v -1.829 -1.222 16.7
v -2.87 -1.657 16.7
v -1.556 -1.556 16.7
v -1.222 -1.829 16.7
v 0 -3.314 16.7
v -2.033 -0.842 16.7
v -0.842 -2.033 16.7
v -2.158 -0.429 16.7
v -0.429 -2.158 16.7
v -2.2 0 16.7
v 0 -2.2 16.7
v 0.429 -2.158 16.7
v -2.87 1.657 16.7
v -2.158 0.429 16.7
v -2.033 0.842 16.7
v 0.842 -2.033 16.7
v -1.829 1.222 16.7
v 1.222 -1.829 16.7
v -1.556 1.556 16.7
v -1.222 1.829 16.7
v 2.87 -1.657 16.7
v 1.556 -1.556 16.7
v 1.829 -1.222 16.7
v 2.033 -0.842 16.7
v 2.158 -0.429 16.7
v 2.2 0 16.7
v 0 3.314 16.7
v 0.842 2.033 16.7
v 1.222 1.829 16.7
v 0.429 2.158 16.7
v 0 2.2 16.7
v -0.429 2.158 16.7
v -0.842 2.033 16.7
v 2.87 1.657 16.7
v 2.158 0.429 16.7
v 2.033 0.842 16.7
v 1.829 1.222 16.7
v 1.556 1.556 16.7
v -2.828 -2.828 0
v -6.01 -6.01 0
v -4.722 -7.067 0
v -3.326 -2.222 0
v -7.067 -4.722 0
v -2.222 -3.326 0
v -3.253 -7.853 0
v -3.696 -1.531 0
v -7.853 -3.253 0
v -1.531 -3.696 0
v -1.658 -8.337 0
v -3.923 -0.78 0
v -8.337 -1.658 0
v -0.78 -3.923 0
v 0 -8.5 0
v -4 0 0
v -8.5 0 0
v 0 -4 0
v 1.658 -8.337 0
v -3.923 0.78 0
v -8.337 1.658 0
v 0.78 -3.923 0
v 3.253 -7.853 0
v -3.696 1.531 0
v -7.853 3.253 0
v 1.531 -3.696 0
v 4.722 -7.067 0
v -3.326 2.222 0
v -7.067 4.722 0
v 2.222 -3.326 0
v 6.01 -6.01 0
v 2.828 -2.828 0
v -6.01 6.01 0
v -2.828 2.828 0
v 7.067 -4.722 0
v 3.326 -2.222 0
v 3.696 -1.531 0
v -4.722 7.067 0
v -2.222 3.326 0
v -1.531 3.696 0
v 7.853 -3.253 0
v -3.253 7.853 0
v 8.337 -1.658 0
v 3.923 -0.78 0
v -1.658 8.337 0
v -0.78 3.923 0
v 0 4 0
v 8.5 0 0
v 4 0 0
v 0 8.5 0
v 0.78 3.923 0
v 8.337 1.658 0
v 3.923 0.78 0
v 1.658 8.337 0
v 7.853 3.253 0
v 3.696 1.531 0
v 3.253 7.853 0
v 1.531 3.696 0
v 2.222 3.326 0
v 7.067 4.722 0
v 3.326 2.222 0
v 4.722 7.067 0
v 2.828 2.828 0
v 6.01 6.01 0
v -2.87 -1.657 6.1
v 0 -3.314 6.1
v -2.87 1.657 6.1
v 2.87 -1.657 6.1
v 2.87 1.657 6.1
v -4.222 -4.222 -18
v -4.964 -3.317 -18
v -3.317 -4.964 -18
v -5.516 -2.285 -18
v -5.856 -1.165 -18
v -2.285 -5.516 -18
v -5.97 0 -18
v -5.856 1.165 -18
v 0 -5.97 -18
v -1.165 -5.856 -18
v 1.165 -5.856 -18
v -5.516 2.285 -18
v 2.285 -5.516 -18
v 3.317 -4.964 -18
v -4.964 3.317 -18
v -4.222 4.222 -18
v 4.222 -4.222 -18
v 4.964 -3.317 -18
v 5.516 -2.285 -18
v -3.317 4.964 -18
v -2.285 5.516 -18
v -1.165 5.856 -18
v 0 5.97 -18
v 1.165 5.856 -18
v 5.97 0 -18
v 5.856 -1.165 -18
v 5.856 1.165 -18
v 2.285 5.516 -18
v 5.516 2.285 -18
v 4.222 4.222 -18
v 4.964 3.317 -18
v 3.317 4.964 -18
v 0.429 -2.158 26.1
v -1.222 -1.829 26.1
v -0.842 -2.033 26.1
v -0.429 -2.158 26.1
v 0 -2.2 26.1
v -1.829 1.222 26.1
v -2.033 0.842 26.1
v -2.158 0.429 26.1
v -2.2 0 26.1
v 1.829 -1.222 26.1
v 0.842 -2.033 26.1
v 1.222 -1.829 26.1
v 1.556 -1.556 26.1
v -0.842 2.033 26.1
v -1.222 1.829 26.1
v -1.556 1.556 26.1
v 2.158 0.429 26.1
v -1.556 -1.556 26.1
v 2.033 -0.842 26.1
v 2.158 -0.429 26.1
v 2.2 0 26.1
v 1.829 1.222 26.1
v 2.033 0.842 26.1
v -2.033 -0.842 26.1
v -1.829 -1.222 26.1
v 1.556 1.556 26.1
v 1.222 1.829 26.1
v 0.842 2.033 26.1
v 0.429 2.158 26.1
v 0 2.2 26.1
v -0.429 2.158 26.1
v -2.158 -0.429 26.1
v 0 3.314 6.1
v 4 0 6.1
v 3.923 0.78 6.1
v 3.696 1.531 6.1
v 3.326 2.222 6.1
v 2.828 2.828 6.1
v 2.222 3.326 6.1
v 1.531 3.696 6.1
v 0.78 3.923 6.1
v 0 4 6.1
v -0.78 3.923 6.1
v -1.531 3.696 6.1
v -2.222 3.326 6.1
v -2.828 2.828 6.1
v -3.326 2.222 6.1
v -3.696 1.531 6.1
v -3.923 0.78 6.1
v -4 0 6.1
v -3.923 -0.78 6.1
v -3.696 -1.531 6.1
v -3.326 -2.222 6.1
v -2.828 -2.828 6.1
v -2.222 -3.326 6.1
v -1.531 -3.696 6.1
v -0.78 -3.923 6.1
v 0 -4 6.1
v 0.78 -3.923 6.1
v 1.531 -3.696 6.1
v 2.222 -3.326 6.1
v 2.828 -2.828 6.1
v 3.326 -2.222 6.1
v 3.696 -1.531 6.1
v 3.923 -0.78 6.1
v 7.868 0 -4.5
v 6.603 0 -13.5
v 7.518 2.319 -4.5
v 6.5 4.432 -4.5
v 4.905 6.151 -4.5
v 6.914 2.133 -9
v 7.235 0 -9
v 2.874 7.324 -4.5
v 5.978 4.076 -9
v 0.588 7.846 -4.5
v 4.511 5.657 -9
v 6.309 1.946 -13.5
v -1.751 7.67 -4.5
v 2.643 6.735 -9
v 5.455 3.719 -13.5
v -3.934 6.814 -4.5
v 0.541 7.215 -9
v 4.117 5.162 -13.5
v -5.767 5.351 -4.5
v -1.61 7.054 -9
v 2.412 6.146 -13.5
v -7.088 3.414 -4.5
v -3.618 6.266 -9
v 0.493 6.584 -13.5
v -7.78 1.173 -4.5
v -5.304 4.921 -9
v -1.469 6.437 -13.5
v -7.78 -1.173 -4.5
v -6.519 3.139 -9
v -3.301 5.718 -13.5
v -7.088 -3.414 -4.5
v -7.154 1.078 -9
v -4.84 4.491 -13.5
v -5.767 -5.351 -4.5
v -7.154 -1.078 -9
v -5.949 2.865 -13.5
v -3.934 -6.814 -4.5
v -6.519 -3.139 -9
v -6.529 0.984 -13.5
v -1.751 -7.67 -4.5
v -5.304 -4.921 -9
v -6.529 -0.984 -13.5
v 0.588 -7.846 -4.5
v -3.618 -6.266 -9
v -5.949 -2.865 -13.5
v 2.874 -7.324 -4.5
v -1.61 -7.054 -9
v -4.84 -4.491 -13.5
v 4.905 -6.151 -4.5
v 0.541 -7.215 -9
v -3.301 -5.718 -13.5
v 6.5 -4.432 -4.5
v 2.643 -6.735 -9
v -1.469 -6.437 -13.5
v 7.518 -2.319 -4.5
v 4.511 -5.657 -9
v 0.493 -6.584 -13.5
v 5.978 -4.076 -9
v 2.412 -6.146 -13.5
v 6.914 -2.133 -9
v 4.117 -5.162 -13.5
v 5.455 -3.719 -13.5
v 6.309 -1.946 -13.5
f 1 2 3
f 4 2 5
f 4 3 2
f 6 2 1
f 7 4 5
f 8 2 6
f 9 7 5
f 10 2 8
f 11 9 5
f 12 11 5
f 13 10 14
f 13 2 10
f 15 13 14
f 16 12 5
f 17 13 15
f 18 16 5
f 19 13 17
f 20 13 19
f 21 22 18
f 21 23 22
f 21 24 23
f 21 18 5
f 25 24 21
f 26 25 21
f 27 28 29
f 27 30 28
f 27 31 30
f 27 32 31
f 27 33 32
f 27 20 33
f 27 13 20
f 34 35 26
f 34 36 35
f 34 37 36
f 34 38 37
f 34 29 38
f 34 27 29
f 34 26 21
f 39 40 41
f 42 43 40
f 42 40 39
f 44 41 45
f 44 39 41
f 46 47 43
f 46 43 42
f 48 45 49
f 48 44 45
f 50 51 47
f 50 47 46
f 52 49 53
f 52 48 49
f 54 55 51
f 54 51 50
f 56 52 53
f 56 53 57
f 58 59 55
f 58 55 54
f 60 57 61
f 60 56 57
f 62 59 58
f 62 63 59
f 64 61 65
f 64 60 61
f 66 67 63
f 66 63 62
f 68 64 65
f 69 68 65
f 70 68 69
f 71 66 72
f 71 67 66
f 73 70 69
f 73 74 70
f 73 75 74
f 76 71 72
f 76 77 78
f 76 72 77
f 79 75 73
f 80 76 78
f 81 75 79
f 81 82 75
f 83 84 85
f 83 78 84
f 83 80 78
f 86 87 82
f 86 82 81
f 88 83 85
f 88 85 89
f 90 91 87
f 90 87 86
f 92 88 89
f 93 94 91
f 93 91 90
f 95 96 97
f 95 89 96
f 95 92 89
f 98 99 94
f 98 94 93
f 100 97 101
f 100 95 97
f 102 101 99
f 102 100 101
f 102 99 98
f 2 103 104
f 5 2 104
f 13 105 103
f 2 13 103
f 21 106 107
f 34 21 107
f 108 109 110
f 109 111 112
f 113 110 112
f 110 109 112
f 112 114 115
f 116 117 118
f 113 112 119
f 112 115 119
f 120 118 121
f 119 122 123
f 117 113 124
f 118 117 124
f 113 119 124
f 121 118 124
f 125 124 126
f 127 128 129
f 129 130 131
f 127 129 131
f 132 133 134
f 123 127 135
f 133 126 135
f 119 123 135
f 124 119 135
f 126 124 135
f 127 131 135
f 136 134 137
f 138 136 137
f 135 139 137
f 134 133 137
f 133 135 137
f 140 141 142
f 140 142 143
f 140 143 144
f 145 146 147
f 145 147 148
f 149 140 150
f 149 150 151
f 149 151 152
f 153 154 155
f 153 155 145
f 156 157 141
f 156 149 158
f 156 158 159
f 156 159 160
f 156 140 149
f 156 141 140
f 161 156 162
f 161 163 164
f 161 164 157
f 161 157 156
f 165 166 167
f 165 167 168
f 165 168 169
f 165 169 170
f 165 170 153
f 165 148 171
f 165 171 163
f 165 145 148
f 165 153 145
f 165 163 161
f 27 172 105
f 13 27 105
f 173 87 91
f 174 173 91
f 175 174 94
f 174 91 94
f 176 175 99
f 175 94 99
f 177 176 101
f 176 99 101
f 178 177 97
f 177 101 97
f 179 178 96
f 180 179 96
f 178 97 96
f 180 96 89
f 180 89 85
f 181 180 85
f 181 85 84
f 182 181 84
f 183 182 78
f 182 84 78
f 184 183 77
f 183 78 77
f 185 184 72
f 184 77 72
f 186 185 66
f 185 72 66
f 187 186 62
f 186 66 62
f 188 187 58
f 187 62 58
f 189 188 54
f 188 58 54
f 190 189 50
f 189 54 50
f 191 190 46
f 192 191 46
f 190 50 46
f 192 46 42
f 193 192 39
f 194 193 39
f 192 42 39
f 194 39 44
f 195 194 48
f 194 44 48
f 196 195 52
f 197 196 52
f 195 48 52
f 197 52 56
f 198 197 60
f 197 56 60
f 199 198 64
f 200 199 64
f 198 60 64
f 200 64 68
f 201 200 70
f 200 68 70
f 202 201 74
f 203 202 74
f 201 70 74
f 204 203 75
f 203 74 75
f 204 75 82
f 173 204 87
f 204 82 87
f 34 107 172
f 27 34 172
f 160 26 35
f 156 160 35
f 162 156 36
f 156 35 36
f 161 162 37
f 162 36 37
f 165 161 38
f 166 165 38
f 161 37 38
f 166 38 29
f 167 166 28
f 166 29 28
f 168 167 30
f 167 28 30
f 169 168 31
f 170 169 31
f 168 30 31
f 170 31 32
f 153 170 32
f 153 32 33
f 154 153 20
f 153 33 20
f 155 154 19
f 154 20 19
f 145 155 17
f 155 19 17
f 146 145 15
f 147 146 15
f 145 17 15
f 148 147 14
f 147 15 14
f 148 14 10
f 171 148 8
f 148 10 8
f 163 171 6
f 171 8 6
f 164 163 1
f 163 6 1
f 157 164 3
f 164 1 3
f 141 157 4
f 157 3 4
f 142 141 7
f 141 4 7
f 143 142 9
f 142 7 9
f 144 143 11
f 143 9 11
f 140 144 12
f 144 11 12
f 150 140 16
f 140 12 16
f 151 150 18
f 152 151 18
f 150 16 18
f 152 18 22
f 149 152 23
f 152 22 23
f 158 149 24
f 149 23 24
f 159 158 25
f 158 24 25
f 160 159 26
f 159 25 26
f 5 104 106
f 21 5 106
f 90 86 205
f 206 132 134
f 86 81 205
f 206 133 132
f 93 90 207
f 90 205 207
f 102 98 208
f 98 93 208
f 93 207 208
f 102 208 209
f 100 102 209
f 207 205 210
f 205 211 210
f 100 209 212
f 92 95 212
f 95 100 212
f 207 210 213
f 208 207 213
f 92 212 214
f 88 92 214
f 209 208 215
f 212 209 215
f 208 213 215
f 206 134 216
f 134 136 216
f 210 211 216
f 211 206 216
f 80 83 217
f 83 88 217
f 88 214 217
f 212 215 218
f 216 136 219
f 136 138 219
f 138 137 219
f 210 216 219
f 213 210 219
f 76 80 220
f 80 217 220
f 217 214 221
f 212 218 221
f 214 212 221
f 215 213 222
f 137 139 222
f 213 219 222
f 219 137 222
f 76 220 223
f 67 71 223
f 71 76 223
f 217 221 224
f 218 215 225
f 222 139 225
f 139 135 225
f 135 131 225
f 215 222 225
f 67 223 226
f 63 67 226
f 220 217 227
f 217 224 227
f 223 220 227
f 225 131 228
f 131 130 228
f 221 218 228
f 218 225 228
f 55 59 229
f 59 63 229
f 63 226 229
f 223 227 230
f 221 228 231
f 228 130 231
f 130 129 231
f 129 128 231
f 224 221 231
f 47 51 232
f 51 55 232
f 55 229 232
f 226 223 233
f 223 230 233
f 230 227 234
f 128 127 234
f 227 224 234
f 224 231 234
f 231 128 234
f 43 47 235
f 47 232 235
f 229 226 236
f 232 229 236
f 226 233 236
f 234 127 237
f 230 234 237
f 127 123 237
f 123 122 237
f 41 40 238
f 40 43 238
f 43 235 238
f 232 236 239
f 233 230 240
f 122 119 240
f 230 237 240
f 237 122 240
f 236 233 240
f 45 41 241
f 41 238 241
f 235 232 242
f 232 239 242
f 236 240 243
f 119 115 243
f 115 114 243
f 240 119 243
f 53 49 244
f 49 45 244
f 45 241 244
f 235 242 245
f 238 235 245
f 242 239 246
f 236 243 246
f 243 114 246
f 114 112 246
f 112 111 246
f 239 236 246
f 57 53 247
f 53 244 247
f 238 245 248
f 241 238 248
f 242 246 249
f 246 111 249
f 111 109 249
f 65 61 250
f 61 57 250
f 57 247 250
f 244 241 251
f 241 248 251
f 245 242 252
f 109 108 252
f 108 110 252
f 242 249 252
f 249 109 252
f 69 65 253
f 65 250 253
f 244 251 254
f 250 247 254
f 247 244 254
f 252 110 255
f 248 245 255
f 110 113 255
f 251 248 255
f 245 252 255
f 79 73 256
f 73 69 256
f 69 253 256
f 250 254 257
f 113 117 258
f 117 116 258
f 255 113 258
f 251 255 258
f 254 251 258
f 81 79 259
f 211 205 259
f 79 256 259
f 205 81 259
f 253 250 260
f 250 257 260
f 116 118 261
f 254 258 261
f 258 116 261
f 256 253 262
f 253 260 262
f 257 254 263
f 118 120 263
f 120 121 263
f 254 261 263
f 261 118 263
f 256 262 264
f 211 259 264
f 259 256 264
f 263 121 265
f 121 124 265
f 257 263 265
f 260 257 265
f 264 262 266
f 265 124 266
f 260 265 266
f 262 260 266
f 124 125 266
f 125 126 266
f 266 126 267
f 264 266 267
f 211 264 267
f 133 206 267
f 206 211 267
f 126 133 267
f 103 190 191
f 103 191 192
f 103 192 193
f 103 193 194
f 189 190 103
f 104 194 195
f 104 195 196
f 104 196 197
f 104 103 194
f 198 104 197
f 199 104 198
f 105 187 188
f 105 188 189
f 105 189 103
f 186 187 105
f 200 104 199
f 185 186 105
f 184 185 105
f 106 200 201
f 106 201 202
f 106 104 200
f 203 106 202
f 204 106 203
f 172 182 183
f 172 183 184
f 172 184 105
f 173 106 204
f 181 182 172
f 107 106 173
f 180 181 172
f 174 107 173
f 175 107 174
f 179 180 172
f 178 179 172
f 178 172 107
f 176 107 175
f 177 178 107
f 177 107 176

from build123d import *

# Parameters (mm, degrees)
F0_R     = 8.5
F1_DEPTH = 18
F1_TAPER = 8
F2_R     = 4
F3_DEPTH = 6.1
F5_DEPTH = 10.6
F6_R     = 2.2
F7_DEPTH = 9.4


with BuildPart() as f1:
    # F0 (on Top) → F1 (new body)
    with BuildSketch(Plane.XY):
        Circle(F0_R)
    extrude(amount=-F1_DEPTH, taper=F1_TAPER)

    # F2 (on Top) → F3 (join)
    with BuildSketch(Plane.XY):
        Circle(F2_R)
    extrude(amount=F3_DEPTH)

    # F4 (on face) → F5 (join)
    with BuildSketch(Plane.XY.offset(6.1)):
        Polygon((0, -3.3139905451), (2.87, -1.6569952726), (2.87, 1.6569952726), (0, 3.3139905451), (-2.87, 1.6569952726), (-2.87, -1.6569952726), align=None)
    extrude(amount=F5_DEPTH)

    # F6 (on face) → F7 (join)
    with BuildSketch(Plane.XY.offset(16.7)):
        Circle(F6_R)
    extrude(amount=F7_DEPTH)


solid = f1.part
